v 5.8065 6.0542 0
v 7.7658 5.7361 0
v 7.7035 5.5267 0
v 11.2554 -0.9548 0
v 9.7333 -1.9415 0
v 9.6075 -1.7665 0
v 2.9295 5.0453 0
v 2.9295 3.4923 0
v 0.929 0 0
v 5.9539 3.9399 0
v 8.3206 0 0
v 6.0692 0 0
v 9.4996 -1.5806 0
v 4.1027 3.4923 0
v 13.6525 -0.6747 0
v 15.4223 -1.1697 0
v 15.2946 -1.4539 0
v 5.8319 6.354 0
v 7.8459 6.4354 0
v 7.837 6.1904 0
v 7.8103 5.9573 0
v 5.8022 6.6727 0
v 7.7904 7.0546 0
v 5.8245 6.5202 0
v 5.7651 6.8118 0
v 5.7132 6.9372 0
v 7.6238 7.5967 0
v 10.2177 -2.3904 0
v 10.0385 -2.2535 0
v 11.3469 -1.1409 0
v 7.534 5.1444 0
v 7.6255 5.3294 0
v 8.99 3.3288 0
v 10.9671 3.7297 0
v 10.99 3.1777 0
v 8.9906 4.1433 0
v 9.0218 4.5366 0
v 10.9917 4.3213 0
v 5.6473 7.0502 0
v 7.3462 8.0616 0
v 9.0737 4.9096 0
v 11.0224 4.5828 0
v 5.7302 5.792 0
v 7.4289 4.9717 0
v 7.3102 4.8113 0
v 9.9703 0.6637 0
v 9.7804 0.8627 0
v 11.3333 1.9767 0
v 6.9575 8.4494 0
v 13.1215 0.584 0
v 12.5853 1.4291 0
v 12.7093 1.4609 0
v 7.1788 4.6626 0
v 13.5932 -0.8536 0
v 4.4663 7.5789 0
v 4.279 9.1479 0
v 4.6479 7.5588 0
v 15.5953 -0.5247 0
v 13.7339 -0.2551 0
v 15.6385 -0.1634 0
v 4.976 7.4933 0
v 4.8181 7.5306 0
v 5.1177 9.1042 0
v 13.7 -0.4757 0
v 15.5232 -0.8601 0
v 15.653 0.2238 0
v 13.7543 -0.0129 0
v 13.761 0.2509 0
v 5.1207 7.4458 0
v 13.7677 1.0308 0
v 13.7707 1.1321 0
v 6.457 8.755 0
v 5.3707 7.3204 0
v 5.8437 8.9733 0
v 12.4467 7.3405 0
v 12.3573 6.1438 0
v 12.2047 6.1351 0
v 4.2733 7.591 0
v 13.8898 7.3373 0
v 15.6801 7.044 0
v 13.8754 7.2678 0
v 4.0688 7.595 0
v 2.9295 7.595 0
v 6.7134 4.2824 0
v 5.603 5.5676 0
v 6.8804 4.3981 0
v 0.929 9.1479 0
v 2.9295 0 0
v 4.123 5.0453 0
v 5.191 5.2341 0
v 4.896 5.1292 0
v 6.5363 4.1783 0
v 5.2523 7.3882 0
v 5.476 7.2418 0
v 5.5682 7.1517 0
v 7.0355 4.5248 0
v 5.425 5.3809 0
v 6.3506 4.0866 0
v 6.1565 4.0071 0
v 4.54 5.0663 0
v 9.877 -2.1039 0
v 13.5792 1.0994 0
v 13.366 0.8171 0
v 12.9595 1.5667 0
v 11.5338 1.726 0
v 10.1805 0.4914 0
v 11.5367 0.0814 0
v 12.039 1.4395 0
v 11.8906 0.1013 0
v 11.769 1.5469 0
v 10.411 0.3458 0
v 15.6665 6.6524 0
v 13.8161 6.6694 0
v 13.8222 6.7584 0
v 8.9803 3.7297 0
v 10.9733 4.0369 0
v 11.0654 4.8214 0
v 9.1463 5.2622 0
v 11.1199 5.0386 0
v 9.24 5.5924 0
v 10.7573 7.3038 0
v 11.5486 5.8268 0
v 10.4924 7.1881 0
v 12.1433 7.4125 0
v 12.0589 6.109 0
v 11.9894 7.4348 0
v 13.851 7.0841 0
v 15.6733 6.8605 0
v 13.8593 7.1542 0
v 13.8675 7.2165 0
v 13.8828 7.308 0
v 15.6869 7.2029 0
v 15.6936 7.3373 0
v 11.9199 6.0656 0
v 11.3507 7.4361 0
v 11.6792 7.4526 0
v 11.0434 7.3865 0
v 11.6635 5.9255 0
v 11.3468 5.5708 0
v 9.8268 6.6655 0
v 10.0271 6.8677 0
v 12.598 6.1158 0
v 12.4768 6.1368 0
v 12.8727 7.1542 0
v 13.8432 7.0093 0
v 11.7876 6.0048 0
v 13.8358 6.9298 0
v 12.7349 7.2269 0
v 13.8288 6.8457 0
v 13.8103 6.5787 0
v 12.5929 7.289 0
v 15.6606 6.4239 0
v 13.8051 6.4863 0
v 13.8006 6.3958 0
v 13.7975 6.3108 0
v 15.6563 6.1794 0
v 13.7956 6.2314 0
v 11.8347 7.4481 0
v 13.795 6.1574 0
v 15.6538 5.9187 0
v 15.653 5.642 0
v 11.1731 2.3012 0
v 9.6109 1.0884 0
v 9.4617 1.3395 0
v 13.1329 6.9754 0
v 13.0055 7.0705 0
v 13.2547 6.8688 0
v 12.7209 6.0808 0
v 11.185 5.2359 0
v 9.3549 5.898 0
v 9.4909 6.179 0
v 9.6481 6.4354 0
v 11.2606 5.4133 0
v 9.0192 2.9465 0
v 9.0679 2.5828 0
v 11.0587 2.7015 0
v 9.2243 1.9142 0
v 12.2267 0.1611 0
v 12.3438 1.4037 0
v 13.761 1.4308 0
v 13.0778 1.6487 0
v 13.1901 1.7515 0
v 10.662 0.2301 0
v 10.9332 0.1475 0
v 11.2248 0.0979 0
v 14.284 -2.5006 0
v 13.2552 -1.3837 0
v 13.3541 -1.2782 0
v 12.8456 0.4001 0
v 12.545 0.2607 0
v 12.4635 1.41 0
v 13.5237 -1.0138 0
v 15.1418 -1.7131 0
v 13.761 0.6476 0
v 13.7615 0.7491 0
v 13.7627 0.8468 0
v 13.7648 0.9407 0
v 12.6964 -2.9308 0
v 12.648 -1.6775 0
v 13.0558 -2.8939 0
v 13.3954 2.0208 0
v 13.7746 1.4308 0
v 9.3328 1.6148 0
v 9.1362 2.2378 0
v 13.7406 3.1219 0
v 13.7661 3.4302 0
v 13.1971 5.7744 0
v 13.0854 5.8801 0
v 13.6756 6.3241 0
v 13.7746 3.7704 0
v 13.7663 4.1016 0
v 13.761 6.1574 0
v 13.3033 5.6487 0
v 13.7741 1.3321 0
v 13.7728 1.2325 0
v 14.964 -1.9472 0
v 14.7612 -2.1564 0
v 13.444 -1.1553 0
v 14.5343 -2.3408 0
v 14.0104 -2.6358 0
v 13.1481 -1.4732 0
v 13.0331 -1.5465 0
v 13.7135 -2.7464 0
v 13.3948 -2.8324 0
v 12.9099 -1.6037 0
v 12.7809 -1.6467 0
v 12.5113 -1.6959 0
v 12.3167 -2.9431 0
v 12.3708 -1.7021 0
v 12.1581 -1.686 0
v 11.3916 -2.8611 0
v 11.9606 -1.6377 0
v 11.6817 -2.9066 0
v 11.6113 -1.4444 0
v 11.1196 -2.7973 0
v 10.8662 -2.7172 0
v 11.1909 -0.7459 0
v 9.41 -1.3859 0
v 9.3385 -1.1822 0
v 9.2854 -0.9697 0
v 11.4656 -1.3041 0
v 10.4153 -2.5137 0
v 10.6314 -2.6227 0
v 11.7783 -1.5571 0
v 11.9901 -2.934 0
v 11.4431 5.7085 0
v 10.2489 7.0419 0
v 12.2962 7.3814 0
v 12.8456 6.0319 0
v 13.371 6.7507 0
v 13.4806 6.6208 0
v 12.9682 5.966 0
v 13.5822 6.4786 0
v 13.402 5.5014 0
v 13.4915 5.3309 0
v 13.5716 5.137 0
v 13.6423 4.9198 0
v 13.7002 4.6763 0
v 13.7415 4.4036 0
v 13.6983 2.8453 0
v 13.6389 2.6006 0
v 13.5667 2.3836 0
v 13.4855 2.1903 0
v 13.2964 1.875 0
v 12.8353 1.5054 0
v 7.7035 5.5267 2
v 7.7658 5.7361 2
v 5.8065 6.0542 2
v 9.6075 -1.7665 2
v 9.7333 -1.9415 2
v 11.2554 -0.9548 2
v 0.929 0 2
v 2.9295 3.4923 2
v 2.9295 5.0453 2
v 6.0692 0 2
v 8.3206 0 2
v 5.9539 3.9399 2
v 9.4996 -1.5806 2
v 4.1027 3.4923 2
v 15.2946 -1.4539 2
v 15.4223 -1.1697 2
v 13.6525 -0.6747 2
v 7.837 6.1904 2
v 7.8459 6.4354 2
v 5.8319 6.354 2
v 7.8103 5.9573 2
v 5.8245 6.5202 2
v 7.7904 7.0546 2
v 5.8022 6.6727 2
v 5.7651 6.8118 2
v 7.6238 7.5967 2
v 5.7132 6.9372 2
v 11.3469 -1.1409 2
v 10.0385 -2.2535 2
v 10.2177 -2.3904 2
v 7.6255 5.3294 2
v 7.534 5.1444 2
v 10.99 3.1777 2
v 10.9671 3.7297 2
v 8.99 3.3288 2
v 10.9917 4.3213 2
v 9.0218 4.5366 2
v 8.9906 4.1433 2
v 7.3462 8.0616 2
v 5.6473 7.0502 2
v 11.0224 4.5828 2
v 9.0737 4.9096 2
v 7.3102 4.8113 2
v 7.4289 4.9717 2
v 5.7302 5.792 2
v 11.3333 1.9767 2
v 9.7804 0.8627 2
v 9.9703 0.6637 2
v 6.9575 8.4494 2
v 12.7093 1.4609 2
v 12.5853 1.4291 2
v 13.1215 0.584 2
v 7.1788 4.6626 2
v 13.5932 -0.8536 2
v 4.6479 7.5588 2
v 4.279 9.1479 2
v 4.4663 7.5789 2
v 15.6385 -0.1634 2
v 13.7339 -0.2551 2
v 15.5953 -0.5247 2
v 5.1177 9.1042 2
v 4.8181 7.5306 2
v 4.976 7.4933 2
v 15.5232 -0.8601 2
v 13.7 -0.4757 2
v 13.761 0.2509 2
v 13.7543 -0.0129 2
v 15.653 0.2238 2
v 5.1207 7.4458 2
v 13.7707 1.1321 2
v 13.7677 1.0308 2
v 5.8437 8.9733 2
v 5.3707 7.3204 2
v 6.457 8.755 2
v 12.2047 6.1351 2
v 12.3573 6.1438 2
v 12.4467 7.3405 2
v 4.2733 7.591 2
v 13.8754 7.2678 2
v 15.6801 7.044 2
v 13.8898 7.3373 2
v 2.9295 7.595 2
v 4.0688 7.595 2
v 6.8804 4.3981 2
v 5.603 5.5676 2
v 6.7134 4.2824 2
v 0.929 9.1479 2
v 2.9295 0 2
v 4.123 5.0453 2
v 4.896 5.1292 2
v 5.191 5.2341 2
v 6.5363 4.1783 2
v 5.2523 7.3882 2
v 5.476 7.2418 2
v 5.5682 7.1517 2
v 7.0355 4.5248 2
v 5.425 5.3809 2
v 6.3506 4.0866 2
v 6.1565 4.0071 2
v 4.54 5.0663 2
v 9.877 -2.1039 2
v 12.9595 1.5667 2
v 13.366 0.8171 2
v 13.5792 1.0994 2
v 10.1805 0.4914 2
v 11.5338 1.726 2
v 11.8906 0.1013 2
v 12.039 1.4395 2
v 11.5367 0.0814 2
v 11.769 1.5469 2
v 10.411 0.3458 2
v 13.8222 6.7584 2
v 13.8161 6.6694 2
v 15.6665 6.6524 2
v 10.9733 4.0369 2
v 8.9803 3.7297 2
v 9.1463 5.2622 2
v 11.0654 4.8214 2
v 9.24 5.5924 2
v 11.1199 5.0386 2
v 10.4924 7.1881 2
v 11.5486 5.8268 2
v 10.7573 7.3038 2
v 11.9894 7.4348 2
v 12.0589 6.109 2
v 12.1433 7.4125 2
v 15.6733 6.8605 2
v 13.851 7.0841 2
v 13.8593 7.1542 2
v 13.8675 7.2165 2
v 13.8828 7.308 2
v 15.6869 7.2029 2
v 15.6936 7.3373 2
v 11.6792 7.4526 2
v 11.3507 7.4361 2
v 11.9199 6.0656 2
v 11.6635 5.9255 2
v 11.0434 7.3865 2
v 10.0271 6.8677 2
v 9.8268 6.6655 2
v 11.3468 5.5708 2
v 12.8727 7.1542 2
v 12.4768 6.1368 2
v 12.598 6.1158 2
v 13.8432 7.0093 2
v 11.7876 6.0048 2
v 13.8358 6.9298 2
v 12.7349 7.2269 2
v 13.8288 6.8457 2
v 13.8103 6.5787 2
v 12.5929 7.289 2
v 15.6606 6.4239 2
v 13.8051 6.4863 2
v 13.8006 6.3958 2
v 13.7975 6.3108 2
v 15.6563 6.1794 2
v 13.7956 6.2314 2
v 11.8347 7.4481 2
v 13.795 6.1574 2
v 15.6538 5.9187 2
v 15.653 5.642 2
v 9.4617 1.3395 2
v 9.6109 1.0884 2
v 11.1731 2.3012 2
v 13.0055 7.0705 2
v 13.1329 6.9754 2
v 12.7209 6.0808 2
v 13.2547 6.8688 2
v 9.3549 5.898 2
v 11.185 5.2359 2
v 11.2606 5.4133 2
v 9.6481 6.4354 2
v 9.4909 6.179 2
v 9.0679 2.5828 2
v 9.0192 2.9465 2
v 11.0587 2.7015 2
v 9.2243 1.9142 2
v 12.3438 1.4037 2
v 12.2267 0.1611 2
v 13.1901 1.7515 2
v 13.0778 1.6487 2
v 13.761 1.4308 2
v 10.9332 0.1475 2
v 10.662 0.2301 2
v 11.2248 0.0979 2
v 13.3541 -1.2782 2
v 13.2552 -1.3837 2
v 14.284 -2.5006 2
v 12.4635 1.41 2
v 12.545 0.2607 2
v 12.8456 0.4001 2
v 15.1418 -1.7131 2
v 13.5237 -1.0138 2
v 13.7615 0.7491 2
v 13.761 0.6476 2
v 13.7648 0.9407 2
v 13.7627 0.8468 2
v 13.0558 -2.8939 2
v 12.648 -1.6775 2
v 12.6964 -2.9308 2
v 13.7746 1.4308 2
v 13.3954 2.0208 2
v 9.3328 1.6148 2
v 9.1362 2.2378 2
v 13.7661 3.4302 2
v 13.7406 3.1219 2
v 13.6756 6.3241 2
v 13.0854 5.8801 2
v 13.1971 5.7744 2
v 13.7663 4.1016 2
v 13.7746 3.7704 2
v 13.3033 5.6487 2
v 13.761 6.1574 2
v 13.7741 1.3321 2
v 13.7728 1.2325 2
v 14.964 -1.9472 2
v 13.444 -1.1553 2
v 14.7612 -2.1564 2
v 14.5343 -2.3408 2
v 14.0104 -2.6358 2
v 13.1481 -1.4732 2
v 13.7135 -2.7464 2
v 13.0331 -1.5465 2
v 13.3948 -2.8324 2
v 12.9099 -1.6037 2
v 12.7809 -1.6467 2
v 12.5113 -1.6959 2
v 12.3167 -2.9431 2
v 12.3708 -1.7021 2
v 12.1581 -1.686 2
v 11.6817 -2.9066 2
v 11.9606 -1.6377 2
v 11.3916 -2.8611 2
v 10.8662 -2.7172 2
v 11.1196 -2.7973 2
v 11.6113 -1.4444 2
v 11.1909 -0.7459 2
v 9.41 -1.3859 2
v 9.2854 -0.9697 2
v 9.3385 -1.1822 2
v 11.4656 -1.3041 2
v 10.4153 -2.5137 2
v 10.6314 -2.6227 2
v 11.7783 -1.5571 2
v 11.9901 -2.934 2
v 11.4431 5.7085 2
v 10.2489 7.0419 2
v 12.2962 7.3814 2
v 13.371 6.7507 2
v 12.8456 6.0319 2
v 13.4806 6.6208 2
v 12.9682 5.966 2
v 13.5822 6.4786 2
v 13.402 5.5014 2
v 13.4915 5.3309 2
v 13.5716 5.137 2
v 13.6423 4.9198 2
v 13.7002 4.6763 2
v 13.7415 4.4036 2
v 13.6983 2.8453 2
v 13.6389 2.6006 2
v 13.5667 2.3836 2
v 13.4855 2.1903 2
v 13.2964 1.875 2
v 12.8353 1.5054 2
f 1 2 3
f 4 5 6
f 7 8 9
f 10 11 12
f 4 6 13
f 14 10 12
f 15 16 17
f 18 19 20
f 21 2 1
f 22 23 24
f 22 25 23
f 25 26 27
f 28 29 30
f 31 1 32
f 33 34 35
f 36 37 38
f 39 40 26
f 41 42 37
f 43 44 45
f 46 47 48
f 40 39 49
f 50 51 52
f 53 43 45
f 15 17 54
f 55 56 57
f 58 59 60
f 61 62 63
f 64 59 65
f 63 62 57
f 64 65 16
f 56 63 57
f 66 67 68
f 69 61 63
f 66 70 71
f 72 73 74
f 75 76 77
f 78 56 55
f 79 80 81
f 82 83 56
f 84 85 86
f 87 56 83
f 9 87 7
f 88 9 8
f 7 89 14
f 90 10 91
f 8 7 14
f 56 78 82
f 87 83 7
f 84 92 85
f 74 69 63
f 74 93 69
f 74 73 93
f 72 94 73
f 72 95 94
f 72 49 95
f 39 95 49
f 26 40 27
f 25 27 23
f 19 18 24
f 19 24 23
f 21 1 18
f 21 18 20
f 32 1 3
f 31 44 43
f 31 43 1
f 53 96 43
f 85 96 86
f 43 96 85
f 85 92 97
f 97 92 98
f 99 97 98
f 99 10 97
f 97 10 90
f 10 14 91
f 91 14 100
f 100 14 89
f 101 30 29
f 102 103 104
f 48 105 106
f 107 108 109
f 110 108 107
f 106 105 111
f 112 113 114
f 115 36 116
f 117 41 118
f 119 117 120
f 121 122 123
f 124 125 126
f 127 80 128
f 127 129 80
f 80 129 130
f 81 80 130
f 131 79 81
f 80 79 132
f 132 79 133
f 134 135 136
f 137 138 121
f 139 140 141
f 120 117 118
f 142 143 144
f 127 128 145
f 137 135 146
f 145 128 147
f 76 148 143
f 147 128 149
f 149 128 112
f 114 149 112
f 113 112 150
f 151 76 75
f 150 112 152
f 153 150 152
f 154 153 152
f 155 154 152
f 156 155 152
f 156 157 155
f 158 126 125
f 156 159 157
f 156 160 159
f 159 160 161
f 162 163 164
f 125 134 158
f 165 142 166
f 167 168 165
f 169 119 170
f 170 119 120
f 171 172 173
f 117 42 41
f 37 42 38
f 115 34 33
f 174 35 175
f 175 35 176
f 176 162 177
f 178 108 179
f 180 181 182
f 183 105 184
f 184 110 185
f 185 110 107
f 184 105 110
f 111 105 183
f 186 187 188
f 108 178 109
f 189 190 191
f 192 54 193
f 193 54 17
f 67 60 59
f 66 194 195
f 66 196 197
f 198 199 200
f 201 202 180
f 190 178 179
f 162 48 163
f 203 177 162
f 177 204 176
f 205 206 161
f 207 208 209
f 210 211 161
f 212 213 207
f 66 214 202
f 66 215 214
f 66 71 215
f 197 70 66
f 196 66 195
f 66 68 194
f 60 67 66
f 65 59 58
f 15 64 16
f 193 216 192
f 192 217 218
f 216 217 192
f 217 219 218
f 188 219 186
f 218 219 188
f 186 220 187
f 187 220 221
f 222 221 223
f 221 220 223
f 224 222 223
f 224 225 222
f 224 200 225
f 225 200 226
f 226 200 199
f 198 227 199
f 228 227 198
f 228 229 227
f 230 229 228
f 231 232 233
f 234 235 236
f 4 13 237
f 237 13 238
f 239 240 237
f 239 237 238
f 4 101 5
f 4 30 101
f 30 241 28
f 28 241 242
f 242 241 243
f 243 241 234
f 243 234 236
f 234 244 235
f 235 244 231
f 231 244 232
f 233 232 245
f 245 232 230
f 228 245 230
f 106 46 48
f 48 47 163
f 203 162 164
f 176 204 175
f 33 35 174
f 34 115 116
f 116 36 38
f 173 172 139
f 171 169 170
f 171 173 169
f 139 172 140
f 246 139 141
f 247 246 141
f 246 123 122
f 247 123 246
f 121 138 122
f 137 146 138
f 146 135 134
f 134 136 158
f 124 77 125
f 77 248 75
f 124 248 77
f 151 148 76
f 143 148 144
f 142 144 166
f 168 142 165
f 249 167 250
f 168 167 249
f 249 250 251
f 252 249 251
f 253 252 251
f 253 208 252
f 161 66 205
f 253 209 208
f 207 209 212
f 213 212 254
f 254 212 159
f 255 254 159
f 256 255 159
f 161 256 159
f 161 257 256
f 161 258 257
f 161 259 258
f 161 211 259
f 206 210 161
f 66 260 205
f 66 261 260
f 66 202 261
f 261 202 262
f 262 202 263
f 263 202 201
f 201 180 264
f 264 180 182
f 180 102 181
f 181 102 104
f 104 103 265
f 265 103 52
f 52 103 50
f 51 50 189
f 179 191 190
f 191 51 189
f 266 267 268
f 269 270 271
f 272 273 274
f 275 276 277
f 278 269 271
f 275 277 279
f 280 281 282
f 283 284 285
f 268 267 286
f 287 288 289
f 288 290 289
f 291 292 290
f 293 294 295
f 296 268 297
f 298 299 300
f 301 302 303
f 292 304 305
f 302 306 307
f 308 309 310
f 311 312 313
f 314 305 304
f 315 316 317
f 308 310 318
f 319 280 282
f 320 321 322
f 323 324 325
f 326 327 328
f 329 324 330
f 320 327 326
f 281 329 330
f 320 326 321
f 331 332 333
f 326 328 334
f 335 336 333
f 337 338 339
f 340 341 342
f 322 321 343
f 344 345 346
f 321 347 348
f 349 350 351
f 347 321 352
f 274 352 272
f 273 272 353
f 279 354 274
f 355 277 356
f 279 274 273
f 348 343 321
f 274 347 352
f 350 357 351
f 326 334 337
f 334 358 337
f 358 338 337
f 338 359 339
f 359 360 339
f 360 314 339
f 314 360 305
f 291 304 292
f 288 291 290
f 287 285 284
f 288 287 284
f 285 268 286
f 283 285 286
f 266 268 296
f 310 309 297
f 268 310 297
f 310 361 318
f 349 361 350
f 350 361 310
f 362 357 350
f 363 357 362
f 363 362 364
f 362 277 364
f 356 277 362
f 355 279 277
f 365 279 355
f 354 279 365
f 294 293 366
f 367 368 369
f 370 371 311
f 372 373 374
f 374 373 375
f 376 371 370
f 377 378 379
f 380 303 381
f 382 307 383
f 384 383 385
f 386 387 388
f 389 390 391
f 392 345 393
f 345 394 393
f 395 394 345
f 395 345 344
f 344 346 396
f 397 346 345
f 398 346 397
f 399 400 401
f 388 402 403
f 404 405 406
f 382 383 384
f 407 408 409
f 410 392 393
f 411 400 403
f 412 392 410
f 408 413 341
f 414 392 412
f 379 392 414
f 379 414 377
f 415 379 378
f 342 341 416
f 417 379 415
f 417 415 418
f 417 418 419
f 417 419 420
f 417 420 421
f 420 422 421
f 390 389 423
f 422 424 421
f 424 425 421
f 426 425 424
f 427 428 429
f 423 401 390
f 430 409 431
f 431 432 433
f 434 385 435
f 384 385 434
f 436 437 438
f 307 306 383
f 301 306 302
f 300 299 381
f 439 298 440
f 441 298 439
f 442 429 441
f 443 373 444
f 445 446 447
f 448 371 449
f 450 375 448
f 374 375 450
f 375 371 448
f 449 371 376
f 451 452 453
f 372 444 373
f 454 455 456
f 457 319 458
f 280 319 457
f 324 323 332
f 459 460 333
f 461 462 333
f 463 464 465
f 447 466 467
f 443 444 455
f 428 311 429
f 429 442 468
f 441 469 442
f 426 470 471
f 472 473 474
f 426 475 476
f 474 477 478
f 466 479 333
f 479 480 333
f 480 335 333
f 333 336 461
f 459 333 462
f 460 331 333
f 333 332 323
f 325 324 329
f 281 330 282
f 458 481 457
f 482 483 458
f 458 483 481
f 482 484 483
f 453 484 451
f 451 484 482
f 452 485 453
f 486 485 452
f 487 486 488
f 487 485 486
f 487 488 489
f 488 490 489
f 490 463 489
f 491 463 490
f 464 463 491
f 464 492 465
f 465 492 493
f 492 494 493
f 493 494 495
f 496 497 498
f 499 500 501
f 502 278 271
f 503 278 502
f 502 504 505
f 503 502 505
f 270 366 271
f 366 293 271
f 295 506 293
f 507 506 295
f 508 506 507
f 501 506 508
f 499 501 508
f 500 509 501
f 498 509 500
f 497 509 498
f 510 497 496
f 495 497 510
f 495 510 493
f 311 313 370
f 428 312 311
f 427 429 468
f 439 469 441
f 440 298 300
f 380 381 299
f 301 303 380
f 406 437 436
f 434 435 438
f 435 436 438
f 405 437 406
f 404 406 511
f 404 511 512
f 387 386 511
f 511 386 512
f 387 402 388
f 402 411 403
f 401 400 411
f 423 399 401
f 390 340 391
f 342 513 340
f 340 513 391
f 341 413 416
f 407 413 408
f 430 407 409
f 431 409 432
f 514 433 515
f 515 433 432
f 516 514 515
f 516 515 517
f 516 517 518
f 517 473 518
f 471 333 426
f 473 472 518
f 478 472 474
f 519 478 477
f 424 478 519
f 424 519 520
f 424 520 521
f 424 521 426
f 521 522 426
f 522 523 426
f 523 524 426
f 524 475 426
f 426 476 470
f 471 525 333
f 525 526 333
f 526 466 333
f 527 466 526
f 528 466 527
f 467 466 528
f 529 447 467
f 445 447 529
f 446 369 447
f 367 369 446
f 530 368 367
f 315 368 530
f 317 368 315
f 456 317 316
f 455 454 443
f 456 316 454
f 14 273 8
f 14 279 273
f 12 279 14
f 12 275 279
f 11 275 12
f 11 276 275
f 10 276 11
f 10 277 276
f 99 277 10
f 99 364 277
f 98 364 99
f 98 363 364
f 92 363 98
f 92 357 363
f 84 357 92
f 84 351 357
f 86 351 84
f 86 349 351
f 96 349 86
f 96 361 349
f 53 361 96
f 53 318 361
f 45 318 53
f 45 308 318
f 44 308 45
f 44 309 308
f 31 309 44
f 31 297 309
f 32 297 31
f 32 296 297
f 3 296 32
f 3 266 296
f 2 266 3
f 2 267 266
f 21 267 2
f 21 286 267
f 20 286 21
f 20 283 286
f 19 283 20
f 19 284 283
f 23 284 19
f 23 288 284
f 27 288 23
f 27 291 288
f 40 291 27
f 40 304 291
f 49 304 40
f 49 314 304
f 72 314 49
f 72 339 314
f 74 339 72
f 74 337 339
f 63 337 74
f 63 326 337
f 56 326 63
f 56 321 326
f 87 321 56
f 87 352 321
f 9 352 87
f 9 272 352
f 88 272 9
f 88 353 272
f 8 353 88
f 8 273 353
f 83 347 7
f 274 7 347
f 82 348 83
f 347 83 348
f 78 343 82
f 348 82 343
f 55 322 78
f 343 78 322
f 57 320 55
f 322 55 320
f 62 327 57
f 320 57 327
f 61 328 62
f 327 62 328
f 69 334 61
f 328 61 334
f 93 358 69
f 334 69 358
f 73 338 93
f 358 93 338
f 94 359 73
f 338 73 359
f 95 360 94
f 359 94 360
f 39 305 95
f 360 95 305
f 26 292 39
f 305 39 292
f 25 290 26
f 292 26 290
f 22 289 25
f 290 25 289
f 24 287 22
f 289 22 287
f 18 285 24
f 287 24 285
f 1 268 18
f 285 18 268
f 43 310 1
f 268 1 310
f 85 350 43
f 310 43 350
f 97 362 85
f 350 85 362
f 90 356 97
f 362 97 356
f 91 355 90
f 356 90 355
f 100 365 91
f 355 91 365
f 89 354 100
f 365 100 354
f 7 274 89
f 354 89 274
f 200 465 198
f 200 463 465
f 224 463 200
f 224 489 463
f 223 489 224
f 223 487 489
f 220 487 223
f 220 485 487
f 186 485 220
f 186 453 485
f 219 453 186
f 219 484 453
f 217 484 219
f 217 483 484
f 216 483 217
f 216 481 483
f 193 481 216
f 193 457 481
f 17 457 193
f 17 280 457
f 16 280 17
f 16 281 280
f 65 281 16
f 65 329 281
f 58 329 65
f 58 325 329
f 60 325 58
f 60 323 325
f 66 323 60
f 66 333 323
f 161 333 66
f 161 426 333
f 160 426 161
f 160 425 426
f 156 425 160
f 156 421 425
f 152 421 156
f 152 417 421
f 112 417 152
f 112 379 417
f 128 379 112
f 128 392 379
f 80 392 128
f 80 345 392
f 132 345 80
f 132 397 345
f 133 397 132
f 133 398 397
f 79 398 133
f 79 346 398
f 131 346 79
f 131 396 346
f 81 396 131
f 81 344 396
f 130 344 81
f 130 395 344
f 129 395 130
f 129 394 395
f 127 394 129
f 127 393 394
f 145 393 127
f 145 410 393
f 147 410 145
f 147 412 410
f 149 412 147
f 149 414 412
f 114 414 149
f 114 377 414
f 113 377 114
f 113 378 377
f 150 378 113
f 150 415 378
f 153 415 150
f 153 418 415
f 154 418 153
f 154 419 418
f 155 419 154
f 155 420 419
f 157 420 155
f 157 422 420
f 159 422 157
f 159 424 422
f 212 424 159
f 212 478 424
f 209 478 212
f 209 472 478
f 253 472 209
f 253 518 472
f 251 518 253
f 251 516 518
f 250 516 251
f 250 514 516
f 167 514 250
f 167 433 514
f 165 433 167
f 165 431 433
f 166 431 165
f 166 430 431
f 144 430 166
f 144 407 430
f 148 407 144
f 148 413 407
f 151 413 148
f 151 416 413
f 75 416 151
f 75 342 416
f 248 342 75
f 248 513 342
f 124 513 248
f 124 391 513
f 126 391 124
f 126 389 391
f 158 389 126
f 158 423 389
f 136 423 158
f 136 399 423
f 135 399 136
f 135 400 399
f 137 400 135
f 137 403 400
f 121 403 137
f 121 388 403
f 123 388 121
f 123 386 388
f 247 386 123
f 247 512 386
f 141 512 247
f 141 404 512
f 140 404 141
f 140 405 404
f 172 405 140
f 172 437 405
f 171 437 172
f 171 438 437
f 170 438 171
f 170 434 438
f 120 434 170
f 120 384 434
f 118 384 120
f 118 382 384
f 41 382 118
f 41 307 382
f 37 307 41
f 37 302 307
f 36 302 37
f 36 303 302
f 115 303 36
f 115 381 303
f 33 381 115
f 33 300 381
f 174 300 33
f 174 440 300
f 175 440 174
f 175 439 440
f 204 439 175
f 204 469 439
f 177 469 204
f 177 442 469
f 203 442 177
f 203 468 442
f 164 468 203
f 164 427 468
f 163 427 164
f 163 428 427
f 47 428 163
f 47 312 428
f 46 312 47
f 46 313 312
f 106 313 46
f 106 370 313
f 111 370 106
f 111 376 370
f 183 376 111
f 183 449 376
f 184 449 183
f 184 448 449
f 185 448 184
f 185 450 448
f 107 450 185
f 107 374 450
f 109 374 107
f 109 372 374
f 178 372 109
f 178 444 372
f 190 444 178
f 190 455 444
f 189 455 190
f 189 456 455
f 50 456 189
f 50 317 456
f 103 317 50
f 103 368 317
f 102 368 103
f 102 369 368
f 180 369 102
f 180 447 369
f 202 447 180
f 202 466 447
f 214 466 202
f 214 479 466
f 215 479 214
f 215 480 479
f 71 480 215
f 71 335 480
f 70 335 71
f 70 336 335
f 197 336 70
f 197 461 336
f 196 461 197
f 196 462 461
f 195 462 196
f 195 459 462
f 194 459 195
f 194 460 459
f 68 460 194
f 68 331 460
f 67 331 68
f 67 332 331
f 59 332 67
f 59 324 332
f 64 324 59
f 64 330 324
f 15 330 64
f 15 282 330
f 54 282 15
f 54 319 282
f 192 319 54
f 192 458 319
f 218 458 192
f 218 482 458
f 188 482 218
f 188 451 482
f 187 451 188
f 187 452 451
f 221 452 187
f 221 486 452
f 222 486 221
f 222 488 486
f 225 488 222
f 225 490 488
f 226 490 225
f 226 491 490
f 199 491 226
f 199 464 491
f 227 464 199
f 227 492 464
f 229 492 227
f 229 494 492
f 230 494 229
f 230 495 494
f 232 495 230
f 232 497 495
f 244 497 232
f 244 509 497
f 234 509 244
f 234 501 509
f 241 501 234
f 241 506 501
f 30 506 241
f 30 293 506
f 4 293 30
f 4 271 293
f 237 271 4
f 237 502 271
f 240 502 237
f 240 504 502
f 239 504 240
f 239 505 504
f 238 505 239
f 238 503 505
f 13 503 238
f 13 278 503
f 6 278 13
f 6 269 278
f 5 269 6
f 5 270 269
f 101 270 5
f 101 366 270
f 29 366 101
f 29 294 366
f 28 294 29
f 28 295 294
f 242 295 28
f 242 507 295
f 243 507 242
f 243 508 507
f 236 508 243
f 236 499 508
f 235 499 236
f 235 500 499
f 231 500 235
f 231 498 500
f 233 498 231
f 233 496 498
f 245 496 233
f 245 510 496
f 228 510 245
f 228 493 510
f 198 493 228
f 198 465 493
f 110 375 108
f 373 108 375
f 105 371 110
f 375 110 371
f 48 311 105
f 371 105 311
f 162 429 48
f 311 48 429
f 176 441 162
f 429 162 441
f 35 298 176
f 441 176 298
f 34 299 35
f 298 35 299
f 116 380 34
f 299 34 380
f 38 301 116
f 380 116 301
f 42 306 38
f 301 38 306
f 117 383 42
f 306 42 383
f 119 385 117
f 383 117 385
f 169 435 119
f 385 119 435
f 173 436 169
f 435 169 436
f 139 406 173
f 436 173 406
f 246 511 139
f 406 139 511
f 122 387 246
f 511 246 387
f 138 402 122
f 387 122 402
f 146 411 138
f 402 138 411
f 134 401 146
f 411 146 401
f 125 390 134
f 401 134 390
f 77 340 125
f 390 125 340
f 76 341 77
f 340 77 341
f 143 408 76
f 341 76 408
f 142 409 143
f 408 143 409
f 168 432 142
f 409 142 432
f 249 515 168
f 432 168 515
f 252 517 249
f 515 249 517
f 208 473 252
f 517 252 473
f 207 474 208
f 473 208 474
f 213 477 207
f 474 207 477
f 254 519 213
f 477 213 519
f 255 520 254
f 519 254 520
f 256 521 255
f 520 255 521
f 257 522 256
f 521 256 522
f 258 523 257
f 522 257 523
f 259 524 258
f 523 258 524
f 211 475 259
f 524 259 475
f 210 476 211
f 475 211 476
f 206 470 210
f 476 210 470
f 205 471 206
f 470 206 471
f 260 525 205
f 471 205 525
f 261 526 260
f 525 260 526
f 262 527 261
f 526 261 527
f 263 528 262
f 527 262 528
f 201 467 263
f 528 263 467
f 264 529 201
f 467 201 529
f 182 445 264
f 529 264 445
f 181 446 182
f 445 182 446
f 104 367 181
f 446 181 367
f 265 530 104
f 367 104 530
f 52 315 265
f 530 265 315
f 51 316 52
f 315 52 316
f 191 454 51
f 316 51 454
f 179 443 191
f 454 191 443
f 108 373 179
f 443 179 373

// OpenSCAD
// oracle: vol-tol 0.005
linear_extrude(2) text("Rg", font="Liberation Mono:style=Bold");
